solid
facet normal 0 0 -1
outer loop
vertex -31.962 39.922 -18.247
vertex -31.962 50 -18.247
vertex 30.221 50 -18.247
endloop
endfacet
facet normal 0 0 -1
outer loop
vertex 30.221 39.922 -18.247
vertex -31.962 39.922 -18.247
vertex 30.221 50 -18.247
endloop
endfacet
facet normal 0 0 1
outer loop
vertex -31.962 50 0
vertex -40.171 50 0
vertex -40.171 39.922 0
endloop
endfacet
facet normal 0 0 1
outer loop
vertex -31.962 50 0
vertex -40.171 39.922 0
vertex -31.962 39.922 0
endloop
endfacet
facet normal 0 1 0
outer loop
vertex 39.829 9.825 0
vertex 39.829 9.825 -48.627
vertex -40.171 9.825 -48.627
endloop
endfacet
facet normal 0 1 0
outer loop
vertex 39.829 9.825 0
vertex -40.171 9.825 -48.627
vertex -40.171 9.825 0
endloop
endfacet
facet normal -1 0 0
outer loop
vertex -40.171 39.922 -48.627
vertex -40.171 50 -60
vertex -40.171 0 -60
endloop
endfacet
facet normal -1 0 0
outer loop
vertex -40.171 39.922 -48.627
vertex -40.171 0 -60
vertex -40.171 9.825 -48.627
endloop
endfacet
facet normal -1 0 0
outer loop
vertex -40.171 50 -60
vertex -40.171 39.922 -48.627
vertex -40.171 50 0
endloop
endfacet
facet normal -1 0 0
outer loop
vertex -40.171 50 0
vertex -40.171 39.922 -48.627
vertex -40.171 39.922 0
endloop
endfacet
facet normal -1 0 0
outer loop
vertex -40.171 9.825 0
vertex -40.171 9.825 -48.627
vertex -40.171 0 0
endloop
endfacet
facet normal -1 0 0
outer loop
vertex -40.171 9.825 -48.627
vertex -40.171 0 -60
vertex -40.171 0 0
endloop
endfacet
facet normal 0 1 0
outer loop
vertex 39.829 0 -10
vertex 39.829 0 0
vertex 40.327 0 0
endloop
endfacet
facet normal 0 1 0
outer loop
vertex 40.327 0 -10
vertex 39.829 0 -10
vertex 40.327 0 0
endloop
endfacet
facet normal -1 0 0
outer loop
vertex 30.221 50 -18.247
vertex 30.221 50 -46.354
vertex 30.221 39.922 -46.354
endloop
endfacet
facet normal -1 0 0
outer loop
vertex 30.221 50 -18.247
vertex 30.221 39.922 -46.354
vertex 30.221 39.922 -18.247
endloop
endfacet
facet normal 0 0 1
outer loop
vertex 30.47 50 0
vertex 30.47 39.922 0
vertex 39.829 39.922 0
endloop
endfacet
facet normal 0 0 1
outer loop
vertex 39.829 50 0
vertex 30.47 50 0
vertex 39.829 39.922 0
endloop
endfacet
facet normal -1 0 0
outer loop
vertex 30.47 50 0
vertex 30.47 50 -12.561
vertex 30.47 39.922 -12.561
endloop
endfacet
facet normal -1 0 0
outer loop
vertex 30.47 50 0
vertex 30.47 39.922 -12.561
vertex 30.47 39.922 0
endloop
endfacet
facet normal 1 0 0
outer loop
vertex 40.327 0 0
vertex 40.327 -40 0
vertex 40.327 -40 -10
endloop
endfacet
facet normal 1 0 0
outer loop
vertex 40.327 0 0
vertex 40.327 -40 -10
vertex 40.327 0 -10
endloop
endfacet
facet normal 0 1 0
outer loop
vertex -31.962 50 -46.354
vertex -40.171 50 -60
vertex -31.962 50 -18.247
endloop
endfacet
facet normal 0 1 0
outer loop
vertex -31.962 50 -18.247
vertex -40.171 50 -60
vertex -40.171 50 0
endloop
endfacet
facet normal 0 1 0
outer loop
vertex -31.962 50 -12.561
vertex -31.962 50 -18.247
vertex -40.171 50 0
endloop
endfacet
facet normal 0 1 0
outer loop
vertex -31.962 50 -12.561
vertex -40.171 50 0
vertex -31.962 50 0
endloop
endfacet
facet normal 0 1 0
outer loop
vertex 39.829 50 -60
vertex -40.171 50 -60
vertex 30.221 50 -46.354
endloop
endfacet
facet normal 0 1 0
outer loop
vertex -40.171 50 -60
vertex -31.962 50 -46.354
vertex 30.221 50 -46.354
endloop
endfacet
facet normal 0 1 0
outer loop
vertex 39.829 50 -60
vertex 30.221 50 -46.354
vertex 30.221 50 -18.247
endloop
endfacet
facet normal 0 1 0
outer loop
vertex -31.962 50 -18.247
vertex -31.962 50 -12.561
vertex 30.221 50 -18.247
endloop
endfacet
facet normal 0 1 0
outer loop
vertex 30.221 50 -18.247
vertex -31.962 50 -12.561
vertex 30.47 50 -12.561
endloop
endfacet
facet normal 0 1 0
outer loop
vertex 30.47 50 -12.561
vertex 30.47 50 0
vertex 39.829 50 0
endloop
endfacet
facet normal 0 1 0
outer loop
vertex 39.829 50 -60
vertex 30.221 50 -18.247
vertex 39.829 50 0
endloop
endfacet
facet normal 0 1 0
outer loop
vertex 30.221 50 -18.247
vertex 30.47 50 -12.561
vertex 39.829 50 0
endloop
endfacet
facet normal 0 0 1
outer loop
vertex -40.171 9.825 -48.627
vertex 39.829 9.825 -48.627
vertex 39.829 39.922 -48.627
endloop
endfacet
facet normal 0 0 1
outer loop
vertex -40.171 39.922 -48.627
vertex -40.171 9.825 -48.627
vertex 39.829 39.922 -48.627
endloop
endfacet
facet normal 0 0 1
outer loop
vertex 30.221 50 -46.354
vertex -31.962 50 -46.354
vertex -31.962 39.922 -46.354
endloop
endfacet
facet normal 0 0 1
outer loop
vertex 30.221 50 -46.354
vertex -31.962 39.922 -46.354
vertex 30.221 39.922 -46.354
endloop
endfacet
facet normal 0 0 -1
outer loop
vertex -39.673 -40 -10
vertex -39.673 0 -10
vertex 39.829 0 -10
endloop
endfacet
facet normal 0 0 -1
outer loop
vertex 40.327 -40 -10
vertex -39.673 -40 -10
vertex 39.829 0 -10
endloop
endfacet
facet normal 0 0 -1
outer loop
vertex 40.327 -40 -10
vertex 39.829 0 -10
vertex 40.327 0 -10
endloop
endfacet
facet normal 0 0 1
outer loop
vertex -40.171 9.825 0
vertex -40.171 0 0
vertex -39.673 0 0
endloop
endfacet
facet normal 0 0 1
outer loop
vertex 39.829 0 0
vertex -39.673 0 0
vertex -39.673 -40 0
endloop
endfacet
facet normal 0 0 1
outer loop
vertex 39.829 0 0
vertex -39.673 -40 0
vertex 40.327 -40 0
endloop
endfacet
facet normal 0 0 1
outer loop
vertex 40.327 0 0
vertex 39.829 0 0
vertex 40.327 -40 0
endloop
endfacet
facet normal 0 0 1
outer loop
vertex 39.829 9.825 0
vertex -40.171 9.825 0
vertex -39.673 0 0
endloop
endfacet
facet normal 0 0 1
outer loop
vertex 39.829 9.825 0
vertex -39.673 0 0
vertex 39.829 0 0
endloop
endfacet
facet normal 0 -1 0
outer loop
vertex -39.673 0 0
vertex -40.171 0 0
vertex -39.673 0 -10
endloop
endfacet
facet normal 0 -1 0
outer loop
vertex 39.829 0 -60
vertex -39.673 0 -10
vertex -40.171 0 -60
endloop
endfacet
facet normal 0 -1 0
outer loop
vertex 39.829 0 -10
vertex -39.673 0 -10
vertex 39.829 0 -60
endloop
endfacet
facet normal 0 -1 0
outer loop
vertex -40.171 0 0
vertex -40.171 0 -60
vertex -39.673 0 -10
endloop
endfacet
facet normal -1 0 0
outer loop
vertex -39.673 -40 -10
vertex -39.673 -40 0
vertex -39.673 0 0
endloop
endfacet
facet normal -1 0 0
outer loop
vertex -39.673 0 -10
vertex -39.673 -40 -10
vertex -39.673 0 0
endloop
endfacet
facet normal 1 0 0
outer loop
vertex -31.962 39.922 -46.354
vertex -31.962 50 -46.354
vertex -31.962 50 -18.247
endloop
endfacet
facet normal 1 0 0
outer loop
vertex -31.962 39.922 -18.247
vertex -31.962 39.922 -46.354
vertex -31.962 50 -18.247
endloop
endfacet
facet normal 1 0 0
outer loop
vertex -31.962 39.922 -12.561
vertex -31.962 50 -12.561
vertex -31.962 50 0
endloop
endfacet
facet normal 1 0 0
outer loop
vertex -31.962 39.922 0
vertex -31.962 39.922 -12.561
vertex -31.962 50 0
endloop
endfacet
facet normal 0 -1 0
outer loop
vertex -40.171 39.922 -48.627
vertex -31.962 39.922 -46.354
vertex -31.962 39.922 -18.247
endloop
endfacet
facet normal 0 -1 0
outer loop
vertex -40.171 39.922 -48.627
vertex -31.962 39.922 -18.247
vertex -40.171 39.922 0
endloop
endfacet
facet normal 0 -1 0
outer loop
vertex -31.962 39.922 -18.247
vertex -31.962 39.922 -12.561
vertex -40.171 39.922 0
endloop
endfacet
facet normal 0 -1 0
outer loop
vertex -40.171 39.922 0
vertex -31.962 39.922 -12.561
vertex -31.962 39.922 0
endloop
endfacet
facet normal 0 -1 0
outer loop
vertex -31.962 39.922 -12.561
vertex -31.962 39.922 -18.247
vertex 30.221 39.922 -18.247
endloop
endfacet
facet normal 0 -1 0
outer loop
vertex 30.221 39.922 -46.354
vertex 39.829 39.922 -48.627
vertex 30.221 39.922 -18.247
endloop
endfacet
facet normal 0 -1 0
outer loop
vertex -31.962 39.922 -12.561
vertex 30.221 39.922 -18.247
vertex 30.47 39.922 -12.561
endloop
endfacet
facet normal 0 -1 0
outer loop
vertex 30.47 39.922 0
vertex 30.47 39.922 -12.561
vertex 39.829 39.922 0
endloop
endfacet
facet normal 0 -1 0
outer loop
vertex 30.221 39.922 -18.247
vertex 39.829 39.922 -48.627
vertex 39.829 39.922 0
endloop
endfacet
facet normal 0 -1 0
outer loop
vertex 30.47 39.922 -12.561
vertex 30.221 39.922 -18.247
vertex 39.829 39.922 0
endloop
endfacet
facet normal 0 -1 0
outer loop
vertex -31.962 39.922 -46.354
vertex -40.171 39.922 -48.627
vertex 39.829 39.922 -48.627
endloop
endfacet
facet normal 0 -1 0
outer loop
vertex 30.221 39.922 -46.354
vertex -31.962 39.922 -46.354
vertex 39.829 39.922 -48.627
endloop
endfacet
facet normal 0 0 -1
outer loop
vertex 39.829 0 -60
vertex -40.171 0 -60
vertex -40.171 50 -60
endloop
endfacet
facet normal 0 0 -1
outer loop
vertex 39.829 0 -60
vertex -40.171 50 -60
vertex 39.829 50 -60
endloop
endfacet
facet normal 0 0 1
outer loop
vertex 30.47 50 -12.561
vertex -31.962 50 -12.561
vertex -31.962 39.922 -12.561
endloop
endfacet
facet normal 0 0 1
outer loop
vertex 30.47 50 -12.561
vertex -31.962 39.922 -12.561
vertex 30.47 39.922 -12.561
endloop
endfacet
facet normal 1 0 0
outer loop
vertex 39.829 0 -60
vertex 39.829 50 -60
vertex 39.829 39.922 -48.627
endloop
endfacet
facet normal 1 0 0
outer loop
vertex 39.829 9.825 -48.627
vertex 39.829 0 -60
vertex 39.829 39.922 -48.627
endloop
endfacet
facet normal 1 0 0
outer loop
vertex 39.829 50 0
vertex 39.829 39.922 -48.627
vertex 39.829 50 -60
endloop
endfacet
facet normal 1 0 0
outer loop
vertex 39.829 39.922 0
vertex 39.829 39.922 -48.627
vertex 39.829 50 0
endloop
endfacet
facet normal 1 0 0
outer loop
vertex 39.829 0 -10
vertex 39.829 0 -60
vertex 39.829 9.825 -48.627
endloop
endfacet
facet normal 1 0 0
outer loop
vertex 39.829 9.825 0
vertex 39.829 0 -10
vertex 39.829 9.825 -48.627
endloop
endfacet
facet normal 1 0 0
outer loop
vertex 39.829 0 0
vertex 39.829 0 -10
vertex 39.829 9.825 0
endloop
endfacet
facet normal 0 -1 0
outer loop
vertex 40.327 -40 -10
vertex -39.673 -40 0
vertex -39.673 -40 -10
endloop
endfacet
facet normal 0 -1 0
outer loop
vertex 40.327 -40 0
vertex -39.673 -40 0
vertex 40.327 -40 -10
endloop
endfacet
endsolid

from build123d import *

# Parameters (mm, degrees)
F1_W          = 80
F1_H          = 60
F2_DEPTH      = 50
F0_W          = 80
F0_H          = 40
F3_DEPTH      = 10
F4_W          = 30.096792616
F4_H          = 78.1024228781
F5_DEPTH      = 50
F5_DEPTH_BACK = 50
F7_W          = 62.432192266
F7_H          = 30.8429924771
F7_W_2        = 62.183458358
F7_H_2        = 28.1069204211
F8_DEPTH      = 25


with BuildPart() as f2:
    # F1 (on Front) → F2 (new body)
    with BuildSketch(Plane.XZ):
        with Locations((-0.1705093682, -30)):
            Rectangle(F1_W, F1_H)
    extrude(amount=-F2_DEPTH)

    # F0 (on Top) → F3 (join)
    with BuildSketch(Plane.XY):
        with Locations((0.3269584477, -20)):
            Rectangle(F0_W, F0_H)
    extrude(amount=-F3_DEPTH)

    # F4 (on Right) → F5 (cut, two sides)
    with BuildSketch(Plane.YZ) as f5_sk:
        with Locations((24.8733828776, -9.576250799)):
            Rectangle(F4_W, F4_H)
    extrude(amount=-F5_DEPTH, mode=Mode.SUBTRACT)
    extrude(f5_sk.sketch, amount=F5_DEPTH_BACK, mode=Mode.SUBTRACT)

    # F7 (on offset) → F8 (cut)
    with BuildSketch(Plane.XZ.offset(-50)):
        with Locations((-0.7462017238, 2.8604404069)):
            Rectangle(F7_W, F7_H)
        with Locations((-0.8705686778, -32.300055027)):
            Rectangle(F7_W_2, F7_H_2)
    extrude(amount=F8_DEPTH, mode=Mode.SUBTRACT)


solid = f2.part
